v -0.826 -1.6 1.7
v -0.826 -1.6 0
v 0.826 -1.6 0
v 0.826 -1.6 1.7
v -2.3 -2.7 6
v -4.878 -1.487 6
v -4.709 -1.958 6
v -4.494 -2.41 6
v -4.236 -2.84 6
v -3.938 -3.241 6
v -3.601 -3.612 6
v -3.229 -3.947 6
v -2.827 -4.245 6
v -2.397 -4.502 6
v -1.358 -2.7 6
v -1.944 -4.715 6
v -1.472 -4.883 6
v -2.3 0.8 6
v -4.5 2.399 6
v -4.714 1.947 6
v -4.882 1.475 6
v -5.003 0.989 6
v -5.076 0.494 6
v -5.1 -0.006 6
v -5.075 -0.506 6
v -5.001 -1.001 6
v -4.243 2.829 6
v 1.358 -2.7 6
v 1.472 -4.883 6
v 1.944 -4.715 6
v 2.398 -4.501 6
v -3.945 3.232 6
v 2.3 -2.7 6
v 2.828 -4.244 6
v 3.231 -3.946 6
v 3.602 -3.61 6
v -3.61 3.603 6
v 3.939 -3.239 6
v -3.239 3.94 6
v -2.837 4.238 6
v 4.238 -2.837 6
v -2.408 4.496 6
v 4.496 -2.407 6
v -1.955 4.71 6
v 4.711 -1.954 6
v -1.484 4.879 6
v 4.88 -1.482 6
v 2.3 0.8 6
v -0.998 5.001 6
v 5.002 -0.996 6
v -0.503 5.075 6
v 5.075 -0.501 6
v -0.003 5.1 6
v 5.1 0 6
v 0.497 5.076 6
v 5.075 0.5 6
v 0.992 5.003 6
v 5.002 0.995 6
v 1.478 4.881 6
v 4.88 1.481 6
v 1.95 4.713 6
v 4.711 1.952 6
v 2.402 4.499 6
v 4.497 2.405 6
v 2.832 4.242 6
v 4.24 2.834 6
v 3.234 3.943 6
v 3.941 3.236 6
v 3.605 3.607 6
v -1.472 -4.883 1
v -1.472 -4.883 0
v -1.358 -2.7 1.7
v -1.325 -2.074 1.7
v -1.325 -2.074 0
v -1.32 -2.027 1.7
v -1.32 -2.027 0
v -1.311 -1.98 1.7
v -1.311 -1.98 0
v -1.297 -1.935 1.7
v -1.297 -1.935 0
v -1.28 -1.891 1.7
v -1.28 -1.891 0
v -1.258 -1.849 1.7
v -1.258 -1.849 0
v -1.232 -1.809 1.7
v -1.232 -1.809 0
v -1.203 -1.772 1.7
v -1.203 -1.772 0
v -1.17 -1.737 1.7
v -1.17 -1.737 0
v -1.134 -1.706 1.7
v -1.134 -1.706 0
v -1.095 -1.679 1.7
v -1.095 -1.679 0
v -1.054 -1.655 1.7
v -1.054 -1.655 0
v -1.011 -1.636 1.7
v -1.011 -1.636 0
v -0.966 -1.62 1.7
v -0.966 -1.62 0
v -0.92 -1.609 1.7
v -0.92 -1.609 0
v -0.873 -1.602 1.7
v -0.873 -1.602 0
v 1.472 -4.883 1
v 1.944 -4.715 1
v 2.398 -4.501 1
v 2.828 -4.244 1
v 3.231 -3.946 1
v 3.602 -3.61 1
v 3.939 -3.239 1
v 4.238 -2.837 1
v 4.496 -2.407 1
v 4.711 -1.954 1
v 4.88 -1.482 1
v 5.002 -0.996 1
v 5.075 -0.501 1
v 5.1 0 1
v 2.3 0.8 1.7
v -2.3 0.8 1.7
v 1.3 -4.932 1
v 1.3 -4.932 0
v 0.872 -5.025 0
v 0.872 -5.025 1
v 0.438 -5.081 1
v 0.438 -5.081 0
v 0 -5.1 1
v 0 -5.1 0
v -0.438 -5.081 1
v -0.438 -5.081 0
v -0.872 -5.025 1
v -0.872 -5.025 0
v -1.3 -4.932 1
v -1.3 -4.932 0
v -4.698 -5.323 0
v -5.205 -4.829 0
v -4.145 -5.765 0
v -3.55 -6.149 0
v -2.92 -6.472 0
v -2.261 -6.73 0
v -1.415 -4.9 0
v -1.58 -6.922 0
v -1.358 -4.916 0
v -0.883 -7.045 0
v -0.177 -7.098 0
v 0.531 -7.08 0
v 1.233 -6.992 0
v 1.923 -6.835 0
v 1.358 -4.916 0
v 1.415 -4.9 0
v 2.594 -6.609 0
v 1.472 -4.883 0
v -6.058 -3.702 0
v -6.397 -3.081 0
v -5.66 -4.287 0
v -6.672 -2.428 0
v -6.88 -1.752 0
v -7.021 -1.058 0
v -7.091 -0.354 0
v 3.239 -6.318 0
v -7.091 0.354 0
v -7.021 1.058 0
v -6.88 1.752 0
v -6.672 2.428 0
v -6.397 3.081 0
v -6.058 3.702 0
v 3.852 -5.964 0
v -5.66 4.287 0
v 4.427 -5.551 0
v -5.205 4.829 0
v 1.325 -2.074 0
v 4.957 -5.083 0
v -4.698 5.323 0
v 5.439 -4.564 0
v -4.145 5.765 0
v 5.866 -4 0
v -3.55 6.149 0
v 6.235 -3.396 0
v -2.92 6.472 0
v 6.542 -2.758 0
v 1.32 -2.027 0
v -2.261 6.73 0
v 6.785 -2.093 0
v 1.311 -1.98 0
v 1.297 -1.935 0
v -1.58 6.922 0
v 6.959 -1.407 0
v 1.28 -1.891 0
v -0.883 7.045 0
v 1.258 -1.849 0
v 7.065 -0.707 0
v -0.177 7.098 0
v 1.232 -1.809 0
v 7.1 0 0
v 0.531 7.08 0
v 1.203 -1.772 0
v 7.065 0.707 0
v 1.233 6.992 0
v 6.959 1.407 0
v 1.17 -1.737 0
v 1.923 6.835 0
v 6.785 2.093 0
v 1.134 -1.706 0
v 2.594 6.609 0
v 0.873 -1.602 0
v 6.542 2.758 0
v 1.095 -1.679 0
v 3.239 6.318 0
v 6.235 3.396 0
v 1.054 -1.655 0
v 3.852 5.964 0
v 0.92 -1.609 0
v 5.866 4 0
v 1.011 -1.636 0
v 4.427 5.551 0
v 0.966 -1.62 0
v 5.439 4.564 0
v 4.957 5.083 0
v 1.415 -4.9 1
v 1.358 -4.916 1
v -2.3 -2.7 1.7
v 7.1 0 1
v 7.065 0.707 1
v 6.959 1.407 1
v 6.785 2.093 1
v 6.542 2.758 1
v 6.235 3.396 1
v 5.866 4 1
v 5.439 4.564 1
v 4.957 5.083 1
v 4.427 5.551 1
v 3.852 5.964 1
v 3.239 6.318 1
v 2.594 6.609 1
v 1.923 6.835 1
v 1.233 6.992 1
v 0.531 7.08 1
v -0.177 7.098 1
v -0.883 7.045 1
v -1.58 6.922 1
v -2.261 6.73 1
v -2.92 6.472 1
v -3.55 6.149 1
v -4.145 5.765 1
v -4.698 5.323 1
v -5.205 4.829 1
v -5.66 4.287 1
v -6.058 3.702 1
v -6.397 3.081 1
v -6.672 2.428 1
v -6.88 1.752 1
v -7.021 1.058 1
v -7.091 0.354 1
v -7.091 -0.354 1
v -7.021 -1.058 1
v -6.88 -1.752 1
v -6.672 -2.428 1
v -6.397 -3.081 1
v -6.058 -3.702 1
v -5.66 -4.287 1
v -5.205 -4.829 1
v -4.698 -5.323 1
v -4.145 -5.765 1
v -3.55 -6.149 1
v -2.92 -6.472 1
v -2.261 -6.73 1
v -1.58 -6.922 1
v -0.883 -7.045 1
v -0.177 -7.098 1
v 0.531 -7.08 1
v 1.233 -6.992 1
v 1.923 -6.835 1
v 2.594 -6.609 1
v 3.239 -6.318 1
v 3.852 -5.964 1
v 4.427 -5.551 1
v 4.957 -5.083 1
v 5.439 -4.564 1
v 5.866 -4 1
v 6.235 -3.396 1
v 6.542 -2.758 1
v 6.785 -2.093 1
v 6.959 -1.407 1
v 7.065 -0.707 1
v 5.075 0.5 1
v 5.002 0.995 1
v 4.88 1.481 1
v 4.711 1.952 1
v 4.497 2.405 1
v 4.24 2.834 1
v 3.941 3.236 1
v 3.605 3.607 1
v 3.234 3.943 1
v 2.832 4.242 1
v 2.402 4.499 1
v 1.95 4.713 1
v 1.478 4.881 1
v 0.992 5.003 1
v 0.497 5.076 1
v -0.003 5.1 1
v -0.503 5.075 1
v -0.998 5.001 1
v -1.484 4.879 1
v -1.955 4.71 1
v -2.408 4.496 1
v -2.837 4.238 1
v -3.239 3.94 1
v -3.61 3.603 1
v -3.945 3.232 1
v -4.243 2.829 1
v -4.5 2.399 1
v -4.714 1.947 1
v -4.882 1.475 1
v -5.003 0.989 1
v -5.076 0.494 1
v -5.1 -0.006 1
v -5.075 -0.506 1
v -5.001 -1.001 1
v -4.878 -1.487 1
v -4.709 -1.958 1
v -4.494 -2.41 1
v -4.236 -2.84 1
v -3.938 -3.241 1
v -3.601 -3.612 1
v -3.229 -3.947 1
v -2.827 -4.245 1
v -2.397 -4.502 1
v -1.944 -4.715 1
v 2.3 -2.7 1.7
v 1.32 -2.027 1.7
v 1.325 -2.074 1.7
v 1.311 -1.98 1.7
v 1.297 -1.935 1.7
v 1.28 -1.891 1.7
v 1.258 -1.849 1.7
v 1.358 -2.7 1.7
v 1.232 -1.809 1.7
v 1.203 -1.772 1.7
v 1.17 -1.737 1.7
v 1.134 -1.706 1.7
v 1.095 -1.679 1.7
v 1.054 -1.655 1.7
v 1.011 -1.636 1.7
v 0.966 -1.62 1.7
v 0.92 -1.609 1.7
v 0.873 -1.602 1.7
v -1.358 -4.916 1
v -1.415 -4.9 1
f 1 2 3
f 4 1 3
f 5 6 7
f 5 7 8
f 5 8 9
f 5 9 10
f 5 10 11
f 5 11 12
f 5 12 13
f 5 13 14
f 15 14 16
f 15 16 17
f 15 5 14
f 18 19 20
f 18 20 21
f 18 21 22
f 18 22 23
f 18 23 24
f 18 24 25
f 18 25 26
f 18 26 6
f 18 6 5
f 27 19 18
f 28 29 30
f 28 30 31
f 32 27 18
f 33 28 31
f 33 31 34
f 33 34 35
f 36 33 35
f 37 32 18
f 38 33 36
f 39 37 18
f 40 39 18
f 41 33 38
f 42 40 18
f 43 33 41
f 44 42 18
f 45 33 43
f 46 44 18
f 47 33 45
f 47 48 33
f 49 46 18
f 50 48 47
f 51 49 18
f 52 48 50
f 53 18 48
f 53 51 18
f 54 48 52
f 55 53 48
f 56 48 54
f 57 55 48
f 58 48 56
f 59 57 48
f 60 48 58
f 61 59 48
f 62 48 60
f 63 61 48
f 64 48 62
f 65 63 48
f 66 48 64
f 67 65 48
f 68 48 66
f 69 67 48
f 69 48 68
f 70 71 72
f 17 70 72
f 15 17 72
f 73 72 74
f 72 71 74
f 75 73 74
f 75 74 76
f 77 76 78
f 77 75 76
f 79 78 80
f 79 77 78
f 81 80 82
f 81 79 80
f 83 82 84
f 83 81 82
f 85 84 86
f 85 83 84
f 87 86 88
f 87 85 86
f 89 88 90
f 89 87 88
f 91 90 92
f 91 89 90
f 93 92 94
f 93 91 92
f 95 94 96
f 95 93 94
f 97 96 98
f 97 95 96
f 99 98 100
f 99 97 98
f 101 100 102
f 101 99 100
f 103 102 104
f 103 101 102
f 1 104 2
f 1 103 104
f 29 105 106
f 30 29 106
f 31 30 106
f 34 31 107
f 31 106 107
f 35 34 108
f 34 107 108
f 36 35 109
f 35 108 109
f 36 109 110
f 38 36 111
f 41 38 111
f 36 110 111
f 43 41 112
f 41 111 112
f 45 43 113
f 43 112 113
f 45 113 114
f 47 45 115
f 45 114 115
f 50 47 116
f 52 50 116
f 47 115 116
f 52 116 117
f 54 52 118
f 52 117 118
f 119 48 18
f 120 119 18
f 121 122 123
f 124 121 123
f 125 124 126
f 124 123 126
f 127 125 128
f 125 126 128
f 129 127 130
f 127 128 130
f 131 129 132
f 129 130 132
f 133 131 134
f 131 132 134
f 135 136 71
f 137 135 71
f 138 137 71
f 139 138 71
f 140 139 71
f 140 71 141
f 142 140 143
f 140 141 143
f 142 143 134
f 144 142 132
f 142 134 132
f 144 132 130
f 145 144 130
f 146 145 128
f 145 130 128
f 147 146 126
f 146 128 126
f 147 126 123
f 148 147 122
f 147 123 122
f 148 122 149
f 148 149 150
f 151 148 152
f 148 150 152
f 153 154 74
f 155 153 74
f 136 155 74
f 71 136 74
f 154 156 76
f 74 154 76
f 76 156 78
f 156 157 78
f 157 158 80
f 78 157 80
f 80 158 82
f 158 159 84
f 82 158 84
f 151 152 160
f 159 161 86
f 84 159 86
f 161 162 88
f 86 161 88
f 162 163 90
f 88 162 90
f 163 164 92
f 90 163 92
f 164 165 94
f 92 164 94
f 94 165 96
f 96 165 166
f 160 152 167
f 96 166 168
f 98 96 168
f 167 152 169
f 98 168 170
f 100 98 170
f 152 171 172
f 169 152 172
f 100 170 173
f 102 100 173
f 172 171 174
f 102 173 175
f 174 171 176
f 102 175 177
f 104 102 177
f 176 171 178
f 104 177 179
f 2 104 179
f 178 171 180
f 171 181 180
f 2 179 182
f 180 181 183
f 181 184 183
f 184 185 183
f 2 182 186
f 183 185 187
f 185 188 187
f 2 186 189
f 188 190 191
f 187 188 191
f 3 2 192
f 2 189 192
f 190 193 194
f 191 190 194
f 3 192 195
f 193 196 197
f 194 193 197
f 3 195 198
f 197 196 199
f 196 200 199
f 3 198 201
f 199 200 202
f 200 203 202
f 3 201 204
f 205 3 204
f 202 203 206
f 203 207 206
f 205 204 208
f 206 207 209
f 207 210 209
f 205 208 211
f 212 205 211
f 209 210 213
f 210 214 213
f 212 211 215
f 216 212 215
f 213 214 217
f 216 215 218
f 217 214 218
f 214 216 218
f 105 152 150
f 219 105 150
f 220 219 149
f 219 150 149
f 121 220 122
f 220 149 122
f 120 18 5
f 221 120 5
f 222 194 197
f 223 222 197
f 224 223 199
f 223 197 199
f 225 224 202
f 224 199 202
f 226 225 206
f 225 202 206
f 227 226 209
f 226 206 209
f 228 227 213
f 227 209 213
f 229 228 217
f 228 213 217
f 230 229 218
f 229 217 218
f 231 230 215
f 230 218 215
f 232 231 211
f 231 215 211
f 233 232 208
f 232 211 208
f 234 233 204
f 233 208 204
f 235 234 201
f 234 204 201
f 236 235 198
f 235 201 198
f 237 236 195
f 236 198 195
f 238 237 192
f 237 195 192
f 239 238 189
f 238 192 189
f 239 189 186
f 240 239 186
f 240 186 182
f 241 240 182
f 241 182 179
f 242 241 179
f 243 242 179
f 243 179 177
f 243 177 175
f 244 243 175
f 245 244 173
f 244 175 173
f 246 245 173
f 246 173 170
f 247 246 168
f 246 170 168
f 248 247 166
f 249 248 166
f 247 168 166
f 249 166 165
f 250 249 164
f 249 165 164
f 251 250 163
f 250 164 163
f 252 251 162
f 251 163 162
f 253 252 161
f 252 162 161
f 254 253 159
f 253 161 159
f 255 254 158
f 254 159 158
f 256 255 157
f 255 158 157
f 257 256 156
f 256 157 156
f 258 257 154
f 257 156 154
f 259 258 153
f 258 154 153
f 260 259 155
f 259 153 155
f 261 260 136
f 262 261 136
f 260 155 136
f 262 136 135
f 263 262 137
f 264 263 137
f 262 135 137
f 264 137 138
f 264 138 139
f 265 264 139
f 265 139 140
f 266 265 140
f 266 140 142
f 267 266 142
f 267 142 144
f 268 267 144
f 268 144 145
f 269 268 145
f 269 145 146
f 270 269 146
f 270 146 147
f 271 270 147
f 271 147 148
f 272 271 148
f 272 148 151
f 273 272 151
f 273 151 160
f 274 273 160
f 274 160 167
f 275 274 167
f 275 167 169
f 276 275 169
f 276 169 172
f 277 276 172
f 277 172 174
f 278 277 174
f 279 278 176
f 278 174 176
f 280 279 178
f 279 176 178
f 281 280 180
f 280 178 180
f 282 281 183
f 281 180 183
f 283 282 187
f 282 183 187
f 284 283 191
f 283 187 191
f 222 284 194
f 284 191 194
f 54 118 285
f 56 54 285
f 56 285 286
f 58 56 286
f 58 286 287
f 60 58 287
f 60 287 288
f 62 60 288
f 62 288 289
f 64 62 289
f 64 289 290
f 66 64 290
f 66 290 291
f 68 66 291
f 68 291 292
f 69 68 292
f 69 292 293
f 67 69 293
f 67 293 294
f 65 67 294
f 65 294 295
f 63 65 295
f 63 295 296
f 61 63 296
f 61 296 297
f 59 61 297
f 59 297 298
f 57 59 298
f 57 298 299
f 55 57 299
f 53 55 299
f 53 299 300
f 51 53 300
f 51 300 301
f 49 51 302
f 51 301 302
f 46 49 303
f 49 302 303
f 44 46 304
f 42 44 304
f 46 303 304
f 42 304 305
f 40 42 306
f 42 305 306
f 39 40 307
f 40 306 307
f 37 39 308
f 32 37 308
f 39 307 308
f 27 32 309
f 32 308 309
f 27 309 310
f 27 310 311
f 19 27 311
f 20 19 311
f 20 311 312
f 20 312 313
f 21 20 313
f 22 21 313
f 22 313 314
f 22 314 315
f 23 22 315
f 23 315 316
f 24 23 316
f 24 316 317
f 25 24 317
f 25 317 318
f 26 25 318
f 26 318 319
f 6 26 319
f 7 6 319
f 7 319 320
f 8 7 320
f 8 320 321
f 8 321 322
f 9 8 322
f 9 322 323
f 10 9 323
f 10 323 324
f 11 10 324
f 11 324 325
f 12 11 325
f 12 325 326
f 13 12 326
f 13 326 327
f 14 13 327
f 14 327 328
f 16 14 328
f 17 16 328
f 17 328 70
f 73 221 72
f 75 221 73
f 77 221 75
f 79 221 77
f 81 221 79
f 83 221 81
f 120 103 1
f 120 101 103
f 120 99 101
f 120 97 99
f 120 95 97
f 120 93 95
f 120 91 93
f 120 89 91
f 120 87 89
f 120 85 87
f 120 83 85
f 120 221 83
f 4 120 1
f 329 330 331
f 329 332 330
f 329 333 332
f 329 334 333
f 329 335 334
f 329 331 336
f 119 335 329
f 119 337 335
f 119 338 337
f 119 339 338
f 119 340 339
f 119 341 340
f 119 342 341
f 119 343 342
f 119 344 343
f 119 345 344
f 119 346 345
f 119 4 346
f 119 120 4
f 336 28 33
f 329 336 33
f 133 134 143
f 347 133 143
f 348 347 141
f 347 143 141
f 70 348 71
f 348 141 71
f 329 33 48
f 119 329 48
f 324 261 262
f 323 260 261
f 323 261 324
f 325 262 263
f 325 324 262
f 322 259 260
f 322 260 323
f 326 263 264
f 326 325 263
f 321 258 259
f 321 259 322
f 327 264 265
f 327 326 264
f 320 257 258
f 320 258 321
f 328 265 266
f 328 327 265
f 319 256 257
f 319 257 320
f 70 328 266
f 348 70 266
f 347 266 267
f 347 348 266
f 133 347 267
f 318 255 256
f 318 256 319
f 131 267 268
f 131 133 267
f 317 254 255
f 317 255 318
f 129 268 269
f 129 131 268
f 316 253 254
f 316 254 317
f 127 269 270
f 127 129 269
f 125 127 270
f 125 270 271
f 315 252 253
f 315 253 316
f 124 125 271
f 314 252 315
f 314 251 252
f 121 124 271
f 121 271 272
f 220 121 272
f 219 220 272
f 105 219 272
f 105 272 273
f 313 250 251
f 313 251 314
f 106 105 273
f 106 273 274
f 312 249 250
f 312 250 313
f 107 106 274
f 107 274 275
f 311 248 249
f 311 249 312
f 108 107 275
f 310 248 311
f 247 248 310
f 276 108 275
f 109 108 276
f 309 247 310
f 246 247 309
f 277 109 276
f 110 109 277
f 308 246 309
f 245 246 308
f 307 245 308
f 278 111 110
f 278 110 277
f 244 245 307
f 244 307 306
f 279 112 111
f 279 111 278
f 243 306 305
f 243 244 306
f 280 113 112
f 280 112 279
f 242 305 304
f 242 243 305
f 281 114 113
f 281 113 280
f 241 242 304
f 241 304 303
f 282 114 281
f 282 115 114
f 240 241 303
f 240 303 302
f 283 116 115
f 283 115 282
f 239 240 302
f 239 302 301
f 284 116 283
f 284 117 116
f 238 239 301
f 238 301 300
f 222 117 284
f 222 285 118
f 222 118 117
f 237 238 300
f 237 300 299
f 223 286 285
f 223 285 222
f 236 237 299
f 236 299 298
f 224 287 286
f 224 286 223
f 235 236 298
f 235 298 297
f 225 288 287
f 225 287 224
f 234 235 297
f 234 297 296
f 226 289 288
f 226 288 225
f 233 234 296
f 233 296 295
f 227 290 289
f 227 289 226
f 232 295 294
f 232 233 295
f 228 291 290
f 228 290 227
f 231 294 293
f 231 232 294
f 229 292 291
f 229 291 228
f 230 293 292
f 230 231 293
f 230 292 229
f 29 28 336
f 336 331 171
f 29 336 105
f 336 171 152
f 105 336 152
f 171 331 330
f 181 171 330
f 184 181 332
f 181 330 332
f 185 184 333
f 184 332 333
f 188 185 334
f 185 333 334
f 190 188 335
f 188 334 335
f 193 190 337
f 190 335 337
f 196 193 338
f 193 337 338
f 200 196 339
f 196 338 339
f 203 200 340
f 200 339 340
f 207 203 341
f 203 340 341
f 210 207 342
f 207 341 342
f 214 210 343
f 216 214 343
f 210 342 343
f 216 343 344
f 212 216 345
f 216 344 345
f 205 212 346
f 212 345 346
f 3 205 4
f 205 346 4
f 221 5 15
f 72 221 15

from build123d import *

# Parameters (mm, degrees)
F0_R     = 7.1
F1_DEPTH = 1
F2_DEPTH = 6
F3_R     = 0.5
F6_DEPTH = 4.3


with BuildPart() as f1:
    # F0 (on Top) → F1 (new body)
    with BuildSketch(Plane.XY):
        Circle(F0_R)
        with BuildLine():
            ThreePointArc((-1.4720513892, -4.8829360745), (-3.0415898733, 4.0937429136), (5.1, 0))
            ThreePointArc((5.1, 0), (4.0937429136, -3.0415898733), (1.4720513892, -4.8829360745))
            ThreePointArc((1.4720513892, -4.8829360745), (1.3862386511, -4.9079876123), (1.3, -4.9315312024))
            ThreePointArc((1.3, -4.9315312024), (0, -5.1), (-1.3, -4.9315312024))
            ThreePointArc((-1.3, -4.9315312024), (-1.3862386511, -4.9079876123), (-1.4720513892, -4.8829360745))
        make_face(mode=Mode.SUBTRACT)
    extrude(amount=F1_DEPTH)

    # F0 (on Top) → F2 (join)
    with BuildSketch(Plane.XY):
        with BuildLine():
            ThreePointArc((1.4720513892, -4.8829360745), (4.0937429136, -3.0415898733), (5.1, 0))
            ThreePointArc((5.1, 0), (-3.0415898733, 4.0937429136), (-1.4720513892, -4.8829360745))
            Line((-1.4720513892, -4.8829360745), (-1.3, -1.6))
            Line((-1.3, -1.6), (1.3, -1.6))
            Line((1.3, -1.6), (1.4720513892, -4.8829360745))
        make_face()
    extrude(amount=F2_DEPTH)

    # F3
    f3_edges = [f1.edges().sort_by_distance(p)[0] for p in [
        (-1.3, -1.6, 3),
        (1.3, -1.6, 3),
    ]]
    fillet(f3_edges, radius=F3_R)

    # F5 (on offset) → F6 (cut)
    with BuildSketch(Plane.XY.offset(6)):
        Polygon((2.3, 0.8), (-2.3, 0.8), (-2.3, -2.7), (-1.3, -2.7), (1.3, -2.7), (2.3, -2.7), align=None)
    extrude(amount=-F6_DEPTH, mode=Mode.SUBTRACT)


solid = f1.part
